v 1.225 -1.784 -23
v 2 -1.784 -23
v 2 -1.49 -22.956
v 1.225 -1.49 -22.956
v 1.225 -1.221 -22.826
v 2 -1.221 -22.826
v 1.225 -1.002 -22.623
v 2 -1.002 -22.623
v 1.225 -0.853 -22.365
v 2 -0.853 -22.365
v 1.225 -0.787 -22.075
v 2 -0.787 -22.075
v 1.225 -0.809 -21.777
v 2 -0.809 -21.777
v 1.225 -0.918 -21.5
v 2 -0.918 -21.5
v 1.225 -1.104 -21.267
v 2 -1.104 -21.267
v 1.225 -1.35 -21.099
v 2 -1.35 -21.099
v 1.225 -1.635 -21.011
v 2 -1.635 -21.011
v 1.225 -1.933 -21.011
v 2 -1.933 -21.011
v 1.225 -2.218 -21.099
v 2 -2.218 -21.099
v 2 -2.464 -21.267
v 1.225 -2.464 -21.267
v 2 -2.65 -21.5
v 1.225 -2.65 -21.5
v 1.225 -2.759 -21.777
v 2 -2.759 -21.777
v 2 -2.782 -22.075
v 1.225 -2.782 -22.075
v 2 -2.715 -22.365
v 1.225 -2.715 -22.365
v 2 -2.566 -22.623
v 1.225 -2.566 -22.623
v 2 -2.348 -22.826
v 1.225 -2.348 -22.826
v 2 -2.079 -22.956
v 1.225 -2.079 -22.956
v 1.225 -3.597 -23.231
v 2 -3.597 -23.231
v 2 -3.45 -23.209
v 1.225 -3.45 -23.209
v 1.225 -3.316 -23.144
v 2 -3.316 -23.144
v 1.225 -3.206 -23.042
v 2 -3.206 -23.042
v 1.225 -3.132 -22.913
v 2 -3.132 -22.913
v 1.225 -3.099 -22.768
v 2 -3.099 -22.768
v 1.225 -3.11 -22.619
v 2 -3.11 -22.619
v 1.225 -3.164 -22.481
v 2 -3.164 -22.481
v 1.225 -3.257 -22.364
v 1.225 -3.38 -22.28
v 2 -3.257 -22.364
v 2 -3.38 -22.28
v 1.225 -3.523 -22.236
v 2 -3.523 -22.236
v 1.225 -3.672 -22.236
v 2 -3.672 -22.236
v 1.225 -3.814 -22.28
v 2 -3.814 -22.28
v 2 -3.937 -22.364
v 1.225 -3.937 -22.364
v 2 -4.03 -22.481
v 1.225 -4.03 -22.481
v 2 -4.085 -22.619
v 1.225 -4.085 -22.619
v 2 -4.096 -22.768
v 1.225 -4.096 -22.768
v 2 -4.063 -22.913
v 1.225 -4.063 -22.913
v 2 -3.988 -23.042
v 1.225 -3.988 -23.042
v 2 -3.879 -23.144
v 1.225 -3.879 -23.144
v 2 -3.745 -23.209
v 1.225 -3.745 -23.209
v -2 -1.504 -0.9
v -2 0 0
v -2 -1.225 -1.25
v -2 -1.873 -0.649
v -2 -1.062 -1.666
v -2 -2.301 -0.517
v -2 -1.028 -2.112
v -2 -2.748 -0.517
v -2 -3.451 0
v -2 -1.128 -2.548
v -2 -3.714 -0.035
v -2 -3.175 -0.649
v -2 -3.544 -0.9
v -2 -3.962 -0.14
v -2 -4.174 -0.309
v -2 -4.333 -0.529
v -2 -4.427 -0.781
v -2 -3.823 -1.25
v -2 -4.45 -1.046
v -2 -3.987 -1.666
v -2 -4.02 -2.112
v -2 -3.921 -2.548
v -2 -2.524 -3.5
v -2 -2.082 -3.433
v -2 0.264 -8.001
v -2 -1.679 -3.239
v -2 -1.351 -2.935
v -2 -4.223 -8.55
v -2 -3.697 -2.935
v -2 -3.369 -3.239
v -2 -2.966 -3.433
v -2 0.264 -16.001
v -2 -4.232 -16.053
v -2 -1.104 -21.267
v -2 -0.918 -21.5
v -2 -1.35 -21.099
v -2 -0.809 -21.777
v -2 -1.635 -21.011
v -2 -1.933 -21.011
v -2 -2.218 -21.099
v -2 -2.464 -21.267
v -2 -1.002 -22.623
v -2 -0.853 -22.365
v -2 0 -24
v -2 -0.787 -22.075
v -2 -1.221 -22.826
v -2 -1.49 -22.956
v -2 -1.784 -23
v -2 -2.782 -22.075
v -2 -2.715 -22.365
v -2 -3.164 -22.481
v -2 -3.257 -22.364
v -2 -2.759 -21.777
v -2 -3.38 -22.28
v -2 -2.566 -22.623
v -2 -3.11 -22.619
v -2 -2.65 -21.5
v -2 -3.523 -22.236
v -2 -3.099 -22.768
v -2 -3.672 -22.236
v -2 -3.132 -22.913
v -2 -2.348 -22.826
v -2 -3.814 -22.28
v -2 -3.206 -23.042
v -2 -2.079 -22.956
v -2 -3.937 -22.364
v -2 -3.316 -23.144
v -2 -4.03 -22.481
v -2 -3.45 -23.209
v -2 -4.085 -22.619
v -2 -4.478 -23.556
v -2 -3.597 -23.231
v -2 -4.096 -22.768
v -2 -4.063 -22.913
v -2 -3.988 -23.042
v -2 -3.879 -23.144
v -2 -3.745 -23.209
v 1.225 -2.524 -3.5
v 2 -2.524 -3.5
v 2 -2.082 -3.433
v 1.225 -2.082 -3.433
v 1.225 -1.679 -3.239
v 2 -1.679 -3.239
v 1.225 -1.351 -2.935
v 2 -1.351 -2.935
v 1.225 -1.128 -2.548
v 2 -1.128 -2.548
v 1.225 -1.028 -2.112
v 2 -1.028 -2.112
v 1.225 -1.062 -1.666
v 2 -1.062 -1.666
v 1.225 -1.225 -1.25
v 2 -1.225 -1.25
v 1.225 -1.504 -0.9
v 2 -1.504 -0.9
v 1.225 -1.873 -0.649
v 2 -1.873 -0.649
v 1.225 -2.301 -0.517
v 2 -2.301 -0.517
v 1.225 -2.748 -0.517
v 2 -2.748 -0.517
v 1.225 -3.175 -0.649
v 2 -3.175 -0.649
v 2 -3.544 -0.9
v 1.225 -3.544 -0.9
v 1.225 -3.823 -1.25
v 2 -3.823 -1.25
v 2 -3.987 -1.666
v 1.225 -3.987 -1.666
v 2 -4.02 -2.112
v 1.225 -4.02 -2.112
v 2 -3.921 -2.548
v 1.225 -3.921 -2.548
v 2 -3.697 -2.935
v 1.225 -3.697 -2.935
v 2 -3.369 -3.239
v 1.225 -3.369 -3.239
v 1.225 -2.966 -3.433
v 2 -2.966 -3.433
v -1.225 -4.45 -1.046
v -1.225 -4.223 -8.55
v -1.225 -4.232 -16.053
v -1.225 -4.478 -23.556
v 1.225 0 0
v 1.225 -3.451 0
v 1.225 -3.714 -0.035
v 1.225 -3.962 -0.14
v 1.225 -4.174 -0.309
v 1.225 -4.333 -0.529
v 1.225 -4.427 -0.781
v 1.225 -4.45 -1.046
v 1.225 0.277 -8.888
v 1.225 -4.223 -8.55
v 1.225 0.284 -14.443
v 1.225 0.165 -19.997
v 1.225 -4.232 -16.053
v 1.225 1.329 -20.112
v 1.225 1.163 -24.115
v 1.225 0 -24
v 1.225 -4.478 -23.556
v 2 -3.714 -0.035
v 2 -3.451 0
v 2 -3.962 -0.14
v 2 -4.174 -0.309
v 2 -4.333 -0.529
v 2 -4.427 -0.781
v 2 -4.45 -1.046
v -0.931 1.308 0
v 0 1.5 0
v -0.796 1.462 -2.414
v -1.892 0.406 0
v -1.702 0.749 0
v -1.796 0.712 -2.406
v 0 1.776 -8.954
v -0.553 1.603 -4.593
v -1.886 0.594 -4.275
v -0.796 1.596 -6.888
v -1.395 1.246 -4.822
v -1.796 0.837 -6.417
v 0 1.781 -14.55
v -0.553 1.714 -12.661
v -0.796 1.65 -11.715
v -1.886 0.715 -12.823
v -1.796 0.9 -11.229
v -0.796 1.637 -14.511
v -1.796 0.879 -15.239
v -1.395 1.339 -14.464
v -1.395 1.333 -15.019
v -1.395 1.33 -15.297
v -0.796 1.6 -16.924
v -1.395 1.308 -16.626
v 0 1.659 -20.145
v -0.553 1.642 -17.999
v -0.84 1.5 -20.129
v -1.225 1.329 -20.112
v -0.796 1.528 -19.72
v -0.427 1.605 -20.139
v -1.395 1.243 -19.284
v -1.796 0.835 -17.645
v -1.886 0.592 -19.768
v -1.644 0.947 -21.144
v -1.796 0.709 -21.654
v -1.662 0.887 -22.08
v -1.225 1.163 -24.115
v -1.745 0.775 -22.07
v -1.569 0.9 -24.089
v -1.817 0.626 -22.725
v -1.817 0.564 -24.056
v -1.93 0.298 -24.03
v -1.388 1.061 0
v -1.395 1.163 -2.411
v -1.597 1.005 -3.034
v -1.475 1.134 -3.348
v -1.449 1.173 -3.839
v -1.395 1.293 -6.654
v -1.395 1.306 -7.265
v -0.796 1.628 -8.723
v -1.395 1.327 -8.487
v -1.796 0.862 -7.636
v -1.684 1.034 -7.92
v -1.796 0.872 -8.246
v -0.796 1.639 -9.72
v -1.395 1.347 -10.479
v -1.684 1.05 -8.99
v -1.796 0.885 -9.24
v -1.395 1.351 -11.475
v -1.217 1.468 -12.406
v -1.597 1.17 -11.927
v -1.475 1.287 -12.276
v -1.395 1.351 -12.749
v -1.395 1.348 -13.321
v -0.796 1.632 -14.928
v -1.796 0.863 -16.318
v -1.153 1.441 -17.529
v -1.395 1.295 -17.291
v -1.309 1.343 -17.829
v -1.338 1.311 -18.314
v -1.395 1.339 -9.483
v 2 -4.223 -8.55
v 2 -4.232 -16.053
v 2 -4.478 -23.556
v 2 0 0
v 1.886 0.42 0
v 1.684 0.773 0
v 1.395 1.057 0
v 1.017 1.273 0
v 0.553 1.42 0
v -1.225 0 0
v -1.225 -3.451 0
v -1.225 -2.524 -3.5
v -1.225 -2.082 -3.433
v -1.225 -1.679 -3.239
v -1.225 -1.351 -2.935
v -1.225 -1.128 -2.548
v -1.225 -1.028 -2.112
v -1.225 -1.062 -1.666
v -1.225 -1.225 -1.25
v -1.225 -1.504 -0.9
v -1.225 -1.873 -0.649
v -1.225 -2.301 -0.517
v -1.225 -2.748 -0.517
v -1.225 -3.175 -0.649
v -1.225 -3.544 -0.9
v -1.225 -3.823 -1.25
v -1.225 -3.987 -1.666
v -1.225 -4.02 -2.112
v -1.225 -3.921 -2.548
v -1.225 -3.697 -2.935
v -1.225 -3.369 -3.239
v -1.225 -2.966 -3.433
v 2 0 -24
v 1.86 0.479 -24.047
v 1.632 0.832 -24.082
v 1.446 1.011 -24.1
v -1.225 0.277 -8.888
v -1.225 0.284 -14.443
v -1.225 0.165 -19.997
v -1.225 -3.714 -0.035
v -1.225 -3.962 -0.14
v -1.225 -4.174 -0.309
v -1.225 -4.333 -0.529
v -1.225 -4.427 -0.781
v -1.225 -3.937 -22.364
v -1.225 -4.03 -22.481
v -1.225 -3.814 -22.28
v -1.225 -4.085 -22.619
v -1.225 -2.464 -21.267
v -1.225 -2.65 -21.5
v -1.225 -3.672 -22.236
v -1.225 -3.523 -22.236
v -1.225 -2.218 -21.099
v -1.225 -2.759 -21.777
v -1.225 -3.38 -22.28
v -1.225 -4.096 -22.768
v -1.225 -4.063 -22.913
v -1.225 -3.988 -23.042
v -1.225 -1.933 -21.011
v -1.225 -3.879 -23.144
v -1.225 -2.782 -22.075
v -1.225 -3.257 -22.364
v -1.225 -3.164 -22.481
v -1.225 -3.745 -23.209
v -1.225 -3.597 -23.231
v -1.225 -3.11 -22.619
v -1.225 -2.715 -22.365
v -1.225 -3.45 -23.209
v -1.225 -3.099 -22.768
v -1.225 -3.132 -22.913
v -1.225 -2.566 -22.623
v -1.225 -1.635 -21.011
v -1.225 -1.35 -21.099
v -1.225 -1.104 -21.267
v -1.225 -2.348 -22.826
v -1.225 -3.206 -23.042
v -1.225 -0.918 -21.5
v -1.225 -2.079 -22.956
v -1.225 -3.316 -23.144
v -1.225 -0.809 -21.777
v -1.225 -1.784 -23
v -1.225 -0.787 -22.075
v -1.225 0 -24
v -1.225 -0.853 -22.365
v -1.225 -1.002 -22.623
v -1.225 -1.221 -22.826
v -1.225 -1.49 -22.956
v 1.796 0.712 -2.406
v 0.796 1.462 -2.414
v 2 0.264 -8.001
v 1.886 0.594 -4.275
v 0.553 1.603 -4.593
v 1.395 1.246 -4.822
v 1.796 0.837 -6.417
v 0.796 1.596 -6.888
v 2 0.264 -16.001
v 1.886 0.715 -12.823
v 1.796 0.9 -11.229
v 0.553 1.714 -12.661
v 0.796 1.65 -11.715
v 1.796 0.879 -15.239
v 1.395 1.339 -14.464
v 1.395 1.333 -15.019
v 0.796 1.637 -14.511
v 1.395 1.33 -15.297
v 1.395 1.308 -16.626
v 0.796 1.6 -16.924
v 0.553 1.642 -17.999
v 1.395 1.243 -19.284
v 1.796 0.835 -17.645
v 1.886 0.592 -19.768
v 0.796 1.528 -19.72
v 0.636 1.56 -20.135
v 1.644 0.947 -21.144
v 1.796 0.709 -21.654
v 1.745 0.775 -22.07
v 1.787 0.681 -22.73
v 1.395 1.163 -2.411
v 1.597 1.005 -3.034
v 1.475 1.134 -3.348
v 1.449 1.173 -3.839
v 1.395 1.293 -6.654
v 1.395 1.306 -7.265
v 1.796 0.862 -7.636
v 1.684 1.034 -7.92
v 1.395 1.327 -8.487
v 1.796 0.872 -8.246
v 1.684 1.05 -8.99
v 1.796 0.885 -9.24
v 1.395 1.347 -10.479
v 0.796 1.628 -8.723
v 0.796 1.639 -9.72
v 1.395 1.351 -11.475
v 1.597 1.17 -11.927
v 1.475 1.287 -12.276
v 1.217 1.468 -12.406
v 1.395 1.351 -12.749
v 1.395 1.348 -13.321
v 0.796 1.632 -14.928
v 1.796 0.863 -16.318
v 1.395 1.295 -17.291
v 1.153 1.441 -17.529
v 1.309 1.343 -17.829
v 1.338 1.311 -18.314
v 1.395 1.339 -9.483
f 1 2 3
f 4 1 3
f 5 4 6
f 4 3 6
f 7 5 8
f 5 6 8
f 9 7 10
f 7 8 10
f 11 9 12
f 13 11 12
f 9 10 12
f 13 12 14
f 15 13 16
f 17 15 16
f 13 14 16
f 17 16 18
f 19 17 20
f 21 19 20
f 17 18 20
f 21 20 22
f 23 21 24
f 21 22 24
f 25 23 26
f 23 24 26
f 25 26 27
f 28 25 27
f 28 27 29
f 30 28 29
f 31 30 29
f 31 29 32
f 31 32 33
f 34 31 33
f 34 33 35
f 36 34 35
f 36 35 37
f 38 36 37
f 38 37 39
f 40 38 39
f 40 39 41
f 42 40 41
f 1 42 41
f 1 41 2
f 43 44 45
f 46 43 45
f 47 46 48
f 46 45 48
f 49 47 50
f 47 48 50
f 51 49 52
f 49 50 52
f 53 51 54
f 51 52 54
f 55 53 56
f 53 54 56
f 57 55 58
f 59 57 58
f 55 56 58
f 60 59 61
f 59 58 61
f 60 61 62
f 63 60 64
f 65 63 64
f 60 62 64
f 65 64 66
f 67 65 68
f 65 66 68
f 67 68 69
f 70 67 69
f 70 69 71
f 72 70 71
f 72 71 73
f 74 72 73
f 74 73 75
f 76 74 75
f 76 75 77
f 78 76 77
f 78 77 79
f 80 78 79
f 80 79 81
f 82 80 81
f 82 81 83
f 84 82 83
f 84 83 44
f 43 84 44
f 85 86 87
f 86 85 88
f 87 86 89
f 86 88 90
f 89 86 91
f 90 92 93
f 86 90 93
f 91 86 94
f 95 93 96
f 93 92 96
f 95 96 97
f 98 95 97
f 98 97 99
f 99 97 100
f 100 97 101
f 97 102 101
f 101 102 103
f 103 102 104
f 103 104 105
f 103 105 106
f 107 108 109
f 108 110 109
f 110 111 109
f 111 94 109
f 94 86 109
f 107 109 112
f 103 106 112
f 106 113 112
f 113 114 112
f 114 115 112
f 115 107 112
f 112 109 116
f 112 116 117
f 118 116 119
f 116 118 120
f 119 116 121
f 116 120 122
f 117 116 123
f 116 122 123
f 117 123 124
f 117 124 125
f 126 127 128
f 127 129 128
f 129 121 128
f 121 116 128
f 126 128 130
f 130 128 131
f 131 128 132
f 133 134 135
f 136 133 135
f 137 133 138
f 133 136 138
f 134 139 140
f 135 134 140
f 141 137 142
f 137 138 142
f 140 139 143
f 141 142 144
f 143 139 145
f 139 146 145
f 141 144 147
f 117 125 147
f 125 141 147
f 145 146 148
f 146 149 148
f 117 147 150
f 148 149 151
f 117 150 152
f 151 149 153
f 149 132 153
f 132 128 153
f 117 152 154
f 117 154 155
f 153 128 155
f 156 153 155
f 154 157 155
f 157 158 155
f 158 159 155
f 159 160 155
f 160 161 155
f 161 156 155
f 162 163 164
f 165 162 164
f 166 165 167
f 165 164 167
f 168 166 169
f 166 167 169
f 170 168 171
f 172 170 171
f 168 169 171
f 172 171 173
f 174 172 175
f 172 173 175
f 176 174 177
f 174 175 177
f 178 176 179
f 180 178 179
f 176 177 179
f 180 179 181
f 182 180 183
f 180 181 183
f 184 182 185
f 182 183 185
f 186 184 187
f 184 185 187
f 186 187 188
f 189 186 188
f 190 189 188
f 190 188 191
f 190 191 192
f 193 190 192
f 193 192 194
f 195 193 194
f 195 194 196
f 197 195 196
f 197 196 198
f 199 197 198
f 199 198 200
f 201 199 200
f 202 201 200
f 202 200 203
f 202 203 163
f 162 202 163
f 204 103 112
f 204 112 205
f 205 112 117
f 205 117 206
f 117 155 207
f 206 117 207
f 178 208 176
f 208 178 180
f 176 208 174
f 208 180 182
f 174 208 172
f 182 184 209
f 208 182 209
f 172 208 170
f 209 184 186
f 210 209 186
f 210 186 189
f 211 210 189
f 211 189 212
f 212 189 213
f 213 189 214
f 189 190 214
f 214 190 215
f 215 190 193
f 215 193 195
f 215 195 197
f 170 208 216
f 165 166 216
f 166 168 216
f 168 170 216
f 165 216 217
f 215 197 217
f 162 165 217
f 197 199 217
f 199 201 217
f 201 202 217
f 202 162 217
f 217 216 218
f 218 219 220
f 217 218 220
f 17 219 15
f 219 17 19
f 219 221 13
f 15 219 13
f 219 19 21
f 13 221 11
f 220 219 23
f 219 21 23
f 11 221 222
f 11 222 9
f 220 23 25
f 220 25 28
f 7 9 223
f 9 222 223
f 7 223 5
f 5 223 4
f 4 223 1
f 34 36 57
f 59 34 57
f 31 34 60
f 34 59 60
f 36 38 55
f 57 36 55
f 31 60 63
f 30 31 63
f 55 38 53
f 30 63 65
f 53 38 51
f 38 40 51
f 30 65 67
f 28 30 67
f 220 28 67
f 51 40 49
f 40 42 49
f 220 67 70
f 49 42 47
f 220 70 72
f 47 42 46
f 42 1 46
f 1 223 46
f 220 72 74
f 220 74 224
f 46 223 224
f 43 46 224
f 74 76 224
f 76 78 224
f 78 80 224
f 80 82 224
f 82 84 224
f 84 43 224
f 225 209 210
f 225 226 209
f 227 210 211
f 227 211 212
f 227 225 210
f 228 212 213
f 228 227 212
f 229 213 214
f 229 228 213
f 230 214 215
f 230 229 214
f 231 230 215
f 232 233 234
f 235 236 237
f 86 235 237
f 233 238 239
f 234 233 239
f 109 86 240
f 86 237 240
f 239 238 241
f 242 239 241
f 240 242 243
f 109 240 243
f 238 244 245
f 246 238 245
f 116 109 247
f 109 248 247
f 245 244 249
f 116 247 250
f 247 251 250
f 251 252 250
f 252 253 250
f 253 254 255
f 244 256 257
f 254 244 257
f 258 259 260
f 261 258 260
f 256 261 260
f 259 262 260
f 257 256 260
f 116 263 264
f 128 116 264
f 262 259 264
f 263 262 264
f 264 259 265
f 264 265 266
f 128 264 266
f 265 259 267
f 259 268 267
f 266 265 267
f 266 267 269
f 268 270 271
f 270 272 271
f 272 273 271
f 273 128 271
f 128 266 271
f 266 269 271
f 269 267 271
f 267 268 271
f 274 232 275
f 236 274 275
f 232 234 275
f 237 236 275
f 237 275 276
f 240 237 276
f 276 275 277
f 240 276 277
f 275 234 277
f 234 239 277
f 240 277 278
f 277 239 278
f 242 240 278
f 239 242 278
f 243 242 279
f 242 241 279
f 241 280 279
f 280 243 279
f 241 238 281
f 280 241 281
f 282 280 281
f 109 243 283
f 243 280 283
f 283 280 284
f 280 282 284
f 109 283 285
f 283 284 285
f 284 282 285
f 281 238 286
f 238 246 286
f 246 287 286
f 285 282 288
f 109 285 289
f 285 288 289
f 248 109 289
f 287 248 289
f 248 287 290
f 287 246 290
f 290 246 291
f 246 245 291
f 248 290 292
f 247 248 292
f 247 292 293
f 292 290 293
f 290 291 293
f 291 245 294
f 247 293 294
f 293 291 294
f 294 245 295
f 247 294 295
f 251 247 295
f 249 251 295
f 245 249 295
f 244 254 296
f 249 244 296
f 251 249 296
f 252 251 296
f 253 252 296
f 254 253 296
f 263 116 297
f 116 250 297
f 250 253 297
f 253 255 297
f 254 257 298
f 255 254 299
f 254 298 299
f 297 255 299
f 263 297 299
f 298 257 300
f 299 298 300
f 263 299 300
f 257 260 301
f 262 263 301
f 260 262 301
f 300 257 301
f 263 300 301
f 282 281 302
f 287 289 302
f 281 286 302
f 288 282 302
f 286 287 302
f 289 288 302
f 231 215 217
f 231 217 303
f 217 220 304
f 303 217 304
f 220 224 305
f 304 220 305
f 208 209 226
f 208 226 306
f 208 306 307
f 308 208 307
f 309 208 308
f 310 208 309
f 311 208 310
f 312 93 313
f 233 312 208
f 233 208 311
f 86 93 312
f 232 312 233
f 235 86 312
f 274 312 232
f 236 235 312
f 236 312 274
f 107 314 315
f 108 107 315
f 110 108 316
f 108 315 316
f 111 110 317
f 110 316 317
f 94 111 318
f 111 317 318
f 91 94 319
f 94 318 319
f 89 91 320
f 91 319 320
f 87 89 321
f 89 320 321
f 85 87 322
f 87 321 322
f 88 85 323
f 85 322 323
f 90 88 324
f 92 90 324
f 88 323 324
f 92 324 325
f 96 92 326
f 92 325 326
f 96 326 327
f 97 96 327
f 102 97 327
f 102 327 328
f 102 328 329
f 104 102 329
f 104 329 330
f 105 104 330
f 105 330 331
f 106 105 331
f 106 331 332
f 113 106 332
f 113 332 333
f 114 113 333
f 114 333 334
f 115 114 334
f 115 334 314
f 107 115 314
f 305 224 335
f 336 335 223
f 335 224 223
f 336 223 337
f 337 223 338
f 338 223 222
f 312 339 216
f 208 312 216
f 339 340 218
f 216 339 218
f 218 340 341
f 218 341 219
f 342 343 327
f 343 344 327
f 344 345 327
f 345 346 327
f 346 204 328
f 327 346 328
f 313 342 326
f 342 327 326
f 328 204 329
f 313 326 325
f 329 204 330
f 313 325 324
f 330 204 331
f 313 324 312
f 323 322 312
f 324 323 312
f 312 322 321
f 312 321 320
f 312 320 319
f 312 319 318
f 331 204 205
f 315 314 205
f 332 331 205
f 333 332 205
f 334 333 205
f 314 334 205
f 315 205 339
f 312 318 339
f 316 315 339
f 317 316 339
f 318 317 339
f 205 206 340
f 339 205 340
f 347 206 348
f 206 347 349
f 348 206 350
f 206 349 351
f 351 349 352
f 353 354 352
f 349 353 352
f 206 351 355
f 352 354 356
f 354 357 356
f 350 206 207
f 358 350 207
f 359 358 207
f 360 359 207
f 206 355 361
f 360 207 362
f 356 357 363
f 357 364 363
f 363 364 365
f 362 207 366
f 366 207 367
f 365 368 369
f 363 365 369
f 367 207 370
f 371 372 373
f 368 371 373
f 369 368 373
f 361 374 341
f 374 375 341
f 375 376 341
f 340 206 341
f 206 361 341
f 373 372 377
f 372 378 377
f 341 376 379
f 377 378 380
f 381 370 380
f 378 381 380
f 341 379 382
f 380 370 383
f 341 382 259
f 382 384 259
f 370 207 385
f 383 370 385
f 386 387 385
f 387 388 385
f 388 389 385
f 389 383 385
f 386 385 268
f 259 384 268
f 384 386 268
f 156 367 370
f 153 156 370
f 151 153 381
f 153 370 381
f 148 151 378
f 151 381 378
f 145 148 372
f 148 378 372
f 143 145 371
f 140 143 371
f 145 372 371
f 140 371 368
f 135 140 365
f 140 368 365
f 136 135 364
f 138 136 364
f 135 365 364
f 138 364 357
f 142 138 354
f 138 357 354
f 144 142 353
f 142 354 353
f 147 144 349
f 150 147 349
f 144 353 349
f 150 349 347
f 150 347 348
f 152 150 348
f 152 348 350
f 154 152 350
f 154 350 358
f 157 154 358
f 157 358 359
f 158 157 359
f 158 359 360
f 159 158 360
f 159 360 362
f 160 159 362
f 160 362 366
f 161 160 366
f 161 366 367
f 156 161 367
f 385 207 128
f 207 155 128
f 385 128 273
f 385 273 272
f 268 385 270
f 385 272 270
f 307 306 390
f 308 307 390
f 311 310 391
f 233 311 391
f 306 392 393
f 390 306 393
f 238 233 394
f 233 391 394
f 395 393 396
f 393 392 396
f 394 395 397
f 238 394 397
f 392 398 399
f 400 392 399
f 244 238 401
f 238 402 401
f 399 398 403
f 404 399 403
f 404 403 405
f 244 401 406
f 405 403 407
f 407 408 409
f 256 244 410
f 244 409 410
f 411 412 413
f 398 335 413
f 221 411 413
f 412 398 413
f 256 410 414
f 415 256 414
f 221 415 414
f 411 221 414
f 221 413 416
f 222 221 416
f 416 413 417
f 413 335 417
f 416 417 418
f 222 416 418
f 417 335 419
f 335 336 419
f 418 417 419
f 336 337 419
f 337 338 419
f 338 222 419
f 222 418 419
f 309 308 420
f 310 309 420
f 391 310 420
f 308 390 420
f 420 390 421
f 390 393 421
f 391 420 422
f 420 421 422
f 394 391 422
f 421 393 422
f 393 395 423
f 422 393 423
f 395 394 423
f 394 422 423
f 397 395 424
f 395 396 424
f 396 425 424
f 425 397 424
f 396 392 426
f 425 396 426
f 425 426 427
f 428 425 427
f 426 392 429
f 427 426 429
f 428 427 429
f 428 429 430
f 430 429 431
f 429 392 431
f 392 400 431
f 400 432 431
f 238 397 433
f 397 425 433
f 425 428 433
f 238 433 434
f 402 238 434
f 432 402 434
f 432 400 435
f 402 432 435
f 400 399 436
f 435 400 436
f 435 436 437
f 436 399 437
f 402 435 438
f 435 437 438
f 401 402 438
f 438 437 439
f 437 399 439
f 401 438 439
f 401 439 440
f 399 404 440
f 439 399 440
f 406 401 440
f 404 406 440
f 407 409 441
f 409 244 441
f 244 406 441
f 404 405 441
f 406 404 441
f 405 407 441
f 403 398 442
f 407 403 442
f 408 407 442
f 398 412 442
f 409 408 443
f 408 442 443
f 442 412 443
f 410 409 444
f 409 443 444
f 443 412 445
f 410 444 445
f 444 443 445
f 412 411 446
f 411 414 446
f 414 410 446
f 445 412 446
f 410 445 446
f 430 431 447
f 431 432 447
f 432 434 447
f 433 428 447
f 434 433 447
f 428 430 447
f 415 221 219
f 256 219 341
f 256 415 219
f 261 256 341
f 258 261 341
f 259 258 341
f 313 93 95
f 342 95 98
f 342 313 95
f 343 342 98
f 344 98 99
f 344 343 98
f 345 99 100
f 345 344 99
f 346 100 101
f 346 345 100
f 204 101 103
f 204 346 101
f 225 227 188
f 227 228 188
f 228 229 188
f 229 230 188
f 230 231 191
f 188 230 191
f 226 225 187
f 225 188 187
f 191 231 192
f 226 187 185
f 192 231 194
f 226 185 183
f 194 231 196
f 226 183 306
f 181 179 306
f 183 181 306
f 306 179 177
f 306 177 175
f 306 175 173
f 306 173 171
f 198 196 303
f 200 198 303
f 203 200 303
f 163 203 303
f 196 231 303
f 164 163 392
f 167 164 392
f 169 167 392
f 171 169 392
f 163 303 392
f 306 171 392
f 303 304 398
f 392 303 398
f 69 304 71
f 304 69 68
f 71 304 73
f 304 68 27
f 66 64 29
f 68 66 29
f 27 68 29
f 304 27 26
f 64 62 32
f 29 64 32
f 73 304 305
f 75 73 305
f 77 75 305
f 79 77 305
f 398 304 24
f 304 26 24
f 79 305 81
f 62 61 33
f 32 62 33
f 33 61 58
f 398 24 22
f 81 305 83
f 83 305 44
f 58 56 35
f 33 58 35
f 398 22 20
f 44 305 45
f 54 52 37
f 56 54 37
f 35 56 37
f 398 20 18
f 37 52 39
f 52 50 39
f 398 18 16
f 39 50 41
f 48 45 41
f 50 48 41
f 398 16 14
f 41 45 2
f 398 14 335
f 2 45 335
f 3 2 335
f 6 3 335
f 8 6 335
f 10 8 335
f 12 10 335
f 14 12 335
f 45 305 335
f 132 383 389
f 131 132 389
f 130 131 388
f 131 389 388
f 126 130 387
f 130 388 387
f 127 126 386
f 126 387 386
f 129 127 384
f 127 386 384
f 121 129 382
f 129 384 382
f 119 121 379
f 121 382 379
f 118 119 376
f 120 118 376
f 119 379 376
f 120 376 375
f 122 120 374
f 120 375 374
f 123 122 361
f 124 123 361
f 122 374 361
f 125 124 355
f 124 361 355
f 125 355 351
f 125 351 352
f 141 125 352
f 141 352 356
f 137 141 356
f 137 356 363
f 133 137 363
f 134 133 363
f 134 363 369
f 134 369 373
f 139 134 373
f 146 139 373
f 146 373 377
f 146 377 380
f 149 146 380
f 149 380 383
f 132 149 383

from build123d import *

# Parameters (mm, degrees)
SKETCH4_R          = 1.5
SKETCH4_R_2        = 1
CUT_EXTRUDE1_DEPTH = 23
FILLET1_R          = 1
SKETCH5_R          = 0.5
CUT_EXTRUDE2_DEPTH = 23
SKETCH6_W          = 2.449612404
SKETCH6_H          = 5.085440949
CUT_EXTRUDE3_DEPTH = 4


with BuildPart() as part:
    # Sweep1: sweep along a path in Sketch2
    with BuildLine() as sweep1_path:  # in the path sketch's own coordinates; laid on its plane below (add() does not lay a ready-made edge on the line's plane)
        add(Edge.make_bspline(
            [(0, 0), (12.002417385, 0.593156544), (24, 0)],
            knots=[0, 0, 0, 1, 1, 1], degree=2))
    # Sketch1 → Sweep1 (sweep)
    with BuildSketch(Plane.XY):
        with BuildLine():
            Line((-1.224806202, 0), (1.224806202, 0))
            Line((1.224806202, 0), (1.224806202, -4.5))
            Line((1.224806202, -4.5), (2, -4.5))
            Line((2, -4.5), (2, 0))
            add(Edge.make_bspline(
                [(2, 0), (1.789237919, 1.363268396), (0, 1.5)],
                knots=[0, 0, 0, 1, 1, 1], degree=2))
            add(Edge.make_bspline(
                [(-2, 0), (-1.789237919, 1.363268396), (0, 1.5)],
                knots=[0, 0, 0, 1, 1, 1], degree=2))
            Line((-2, 0), (-2, -4.5))
            Line((-2, -4.5), (-1.224806202, -4.5))
            Line((-1.224806202, -4.5), (-1.224806202, 0))
        make_face()
    sweep(path=Plane(origin=(0, 0, 0), x_dir=(0, 0, -1), z_dir=(1, 0, 0)) * sweep1_path.line)

    # Sketch4 → Cut-Extrude1 (cut)
    with BuildSketch(Plane(origin=(2, 0, 0), x_dir=(0, 0, -1), z_dir=(1, 0, 0))):
        with Locations((2, -2.524194964)):
            Circle(SKETCH4_R)
        with Locations((22, -1.784311687)):
            Circle(SKETCH4_R_2)
    extrude(amount=-CUT_EXTRUDE1_DEPTH, mode=Mode.SUBTRACT)

    # Fillet1
    fillet1_edges = [part.edges().sort_by_distance(p)[0] for p in [
        (-1.612403101, -4.5, 0),
        (1.612403101, -4.5, 0),
    ]]
    fillet(fillet1_edges, radius=FILLET1_R)

    # Sketch5 → Cut-Extrude2 (cut)
    with BuildSketch(Plane(origin=(2, 0, 0), x_dir=(0, 0, -1), z_dir=(1, 0, 0))):
        with Locations((22.73074773, -3.597243091)):
            Circle(SKETCH5_R)
    extrude(amount=-CUT_EXTRUDE2_DEPTH, mode=Mode.SUBTRACT)

    # Sketch6 → Cut-Extrude3 (cut)
    with BuildSketch(Plane(origin=(0, -2.35530576, -23.766585519), x_dir=(-1, 0, 0), z_dir=(0, -0.09861847381015884, -0.9951253170447204))):
        with Locations((0, 3.230896736)):
            Rectangle(SKETCH6_W, SKETCH6_H)
    extrude(amount=-CUT_EXTRUDE3_DEPTH, mode=Mode.SUBTRACT)


solid = part.part
